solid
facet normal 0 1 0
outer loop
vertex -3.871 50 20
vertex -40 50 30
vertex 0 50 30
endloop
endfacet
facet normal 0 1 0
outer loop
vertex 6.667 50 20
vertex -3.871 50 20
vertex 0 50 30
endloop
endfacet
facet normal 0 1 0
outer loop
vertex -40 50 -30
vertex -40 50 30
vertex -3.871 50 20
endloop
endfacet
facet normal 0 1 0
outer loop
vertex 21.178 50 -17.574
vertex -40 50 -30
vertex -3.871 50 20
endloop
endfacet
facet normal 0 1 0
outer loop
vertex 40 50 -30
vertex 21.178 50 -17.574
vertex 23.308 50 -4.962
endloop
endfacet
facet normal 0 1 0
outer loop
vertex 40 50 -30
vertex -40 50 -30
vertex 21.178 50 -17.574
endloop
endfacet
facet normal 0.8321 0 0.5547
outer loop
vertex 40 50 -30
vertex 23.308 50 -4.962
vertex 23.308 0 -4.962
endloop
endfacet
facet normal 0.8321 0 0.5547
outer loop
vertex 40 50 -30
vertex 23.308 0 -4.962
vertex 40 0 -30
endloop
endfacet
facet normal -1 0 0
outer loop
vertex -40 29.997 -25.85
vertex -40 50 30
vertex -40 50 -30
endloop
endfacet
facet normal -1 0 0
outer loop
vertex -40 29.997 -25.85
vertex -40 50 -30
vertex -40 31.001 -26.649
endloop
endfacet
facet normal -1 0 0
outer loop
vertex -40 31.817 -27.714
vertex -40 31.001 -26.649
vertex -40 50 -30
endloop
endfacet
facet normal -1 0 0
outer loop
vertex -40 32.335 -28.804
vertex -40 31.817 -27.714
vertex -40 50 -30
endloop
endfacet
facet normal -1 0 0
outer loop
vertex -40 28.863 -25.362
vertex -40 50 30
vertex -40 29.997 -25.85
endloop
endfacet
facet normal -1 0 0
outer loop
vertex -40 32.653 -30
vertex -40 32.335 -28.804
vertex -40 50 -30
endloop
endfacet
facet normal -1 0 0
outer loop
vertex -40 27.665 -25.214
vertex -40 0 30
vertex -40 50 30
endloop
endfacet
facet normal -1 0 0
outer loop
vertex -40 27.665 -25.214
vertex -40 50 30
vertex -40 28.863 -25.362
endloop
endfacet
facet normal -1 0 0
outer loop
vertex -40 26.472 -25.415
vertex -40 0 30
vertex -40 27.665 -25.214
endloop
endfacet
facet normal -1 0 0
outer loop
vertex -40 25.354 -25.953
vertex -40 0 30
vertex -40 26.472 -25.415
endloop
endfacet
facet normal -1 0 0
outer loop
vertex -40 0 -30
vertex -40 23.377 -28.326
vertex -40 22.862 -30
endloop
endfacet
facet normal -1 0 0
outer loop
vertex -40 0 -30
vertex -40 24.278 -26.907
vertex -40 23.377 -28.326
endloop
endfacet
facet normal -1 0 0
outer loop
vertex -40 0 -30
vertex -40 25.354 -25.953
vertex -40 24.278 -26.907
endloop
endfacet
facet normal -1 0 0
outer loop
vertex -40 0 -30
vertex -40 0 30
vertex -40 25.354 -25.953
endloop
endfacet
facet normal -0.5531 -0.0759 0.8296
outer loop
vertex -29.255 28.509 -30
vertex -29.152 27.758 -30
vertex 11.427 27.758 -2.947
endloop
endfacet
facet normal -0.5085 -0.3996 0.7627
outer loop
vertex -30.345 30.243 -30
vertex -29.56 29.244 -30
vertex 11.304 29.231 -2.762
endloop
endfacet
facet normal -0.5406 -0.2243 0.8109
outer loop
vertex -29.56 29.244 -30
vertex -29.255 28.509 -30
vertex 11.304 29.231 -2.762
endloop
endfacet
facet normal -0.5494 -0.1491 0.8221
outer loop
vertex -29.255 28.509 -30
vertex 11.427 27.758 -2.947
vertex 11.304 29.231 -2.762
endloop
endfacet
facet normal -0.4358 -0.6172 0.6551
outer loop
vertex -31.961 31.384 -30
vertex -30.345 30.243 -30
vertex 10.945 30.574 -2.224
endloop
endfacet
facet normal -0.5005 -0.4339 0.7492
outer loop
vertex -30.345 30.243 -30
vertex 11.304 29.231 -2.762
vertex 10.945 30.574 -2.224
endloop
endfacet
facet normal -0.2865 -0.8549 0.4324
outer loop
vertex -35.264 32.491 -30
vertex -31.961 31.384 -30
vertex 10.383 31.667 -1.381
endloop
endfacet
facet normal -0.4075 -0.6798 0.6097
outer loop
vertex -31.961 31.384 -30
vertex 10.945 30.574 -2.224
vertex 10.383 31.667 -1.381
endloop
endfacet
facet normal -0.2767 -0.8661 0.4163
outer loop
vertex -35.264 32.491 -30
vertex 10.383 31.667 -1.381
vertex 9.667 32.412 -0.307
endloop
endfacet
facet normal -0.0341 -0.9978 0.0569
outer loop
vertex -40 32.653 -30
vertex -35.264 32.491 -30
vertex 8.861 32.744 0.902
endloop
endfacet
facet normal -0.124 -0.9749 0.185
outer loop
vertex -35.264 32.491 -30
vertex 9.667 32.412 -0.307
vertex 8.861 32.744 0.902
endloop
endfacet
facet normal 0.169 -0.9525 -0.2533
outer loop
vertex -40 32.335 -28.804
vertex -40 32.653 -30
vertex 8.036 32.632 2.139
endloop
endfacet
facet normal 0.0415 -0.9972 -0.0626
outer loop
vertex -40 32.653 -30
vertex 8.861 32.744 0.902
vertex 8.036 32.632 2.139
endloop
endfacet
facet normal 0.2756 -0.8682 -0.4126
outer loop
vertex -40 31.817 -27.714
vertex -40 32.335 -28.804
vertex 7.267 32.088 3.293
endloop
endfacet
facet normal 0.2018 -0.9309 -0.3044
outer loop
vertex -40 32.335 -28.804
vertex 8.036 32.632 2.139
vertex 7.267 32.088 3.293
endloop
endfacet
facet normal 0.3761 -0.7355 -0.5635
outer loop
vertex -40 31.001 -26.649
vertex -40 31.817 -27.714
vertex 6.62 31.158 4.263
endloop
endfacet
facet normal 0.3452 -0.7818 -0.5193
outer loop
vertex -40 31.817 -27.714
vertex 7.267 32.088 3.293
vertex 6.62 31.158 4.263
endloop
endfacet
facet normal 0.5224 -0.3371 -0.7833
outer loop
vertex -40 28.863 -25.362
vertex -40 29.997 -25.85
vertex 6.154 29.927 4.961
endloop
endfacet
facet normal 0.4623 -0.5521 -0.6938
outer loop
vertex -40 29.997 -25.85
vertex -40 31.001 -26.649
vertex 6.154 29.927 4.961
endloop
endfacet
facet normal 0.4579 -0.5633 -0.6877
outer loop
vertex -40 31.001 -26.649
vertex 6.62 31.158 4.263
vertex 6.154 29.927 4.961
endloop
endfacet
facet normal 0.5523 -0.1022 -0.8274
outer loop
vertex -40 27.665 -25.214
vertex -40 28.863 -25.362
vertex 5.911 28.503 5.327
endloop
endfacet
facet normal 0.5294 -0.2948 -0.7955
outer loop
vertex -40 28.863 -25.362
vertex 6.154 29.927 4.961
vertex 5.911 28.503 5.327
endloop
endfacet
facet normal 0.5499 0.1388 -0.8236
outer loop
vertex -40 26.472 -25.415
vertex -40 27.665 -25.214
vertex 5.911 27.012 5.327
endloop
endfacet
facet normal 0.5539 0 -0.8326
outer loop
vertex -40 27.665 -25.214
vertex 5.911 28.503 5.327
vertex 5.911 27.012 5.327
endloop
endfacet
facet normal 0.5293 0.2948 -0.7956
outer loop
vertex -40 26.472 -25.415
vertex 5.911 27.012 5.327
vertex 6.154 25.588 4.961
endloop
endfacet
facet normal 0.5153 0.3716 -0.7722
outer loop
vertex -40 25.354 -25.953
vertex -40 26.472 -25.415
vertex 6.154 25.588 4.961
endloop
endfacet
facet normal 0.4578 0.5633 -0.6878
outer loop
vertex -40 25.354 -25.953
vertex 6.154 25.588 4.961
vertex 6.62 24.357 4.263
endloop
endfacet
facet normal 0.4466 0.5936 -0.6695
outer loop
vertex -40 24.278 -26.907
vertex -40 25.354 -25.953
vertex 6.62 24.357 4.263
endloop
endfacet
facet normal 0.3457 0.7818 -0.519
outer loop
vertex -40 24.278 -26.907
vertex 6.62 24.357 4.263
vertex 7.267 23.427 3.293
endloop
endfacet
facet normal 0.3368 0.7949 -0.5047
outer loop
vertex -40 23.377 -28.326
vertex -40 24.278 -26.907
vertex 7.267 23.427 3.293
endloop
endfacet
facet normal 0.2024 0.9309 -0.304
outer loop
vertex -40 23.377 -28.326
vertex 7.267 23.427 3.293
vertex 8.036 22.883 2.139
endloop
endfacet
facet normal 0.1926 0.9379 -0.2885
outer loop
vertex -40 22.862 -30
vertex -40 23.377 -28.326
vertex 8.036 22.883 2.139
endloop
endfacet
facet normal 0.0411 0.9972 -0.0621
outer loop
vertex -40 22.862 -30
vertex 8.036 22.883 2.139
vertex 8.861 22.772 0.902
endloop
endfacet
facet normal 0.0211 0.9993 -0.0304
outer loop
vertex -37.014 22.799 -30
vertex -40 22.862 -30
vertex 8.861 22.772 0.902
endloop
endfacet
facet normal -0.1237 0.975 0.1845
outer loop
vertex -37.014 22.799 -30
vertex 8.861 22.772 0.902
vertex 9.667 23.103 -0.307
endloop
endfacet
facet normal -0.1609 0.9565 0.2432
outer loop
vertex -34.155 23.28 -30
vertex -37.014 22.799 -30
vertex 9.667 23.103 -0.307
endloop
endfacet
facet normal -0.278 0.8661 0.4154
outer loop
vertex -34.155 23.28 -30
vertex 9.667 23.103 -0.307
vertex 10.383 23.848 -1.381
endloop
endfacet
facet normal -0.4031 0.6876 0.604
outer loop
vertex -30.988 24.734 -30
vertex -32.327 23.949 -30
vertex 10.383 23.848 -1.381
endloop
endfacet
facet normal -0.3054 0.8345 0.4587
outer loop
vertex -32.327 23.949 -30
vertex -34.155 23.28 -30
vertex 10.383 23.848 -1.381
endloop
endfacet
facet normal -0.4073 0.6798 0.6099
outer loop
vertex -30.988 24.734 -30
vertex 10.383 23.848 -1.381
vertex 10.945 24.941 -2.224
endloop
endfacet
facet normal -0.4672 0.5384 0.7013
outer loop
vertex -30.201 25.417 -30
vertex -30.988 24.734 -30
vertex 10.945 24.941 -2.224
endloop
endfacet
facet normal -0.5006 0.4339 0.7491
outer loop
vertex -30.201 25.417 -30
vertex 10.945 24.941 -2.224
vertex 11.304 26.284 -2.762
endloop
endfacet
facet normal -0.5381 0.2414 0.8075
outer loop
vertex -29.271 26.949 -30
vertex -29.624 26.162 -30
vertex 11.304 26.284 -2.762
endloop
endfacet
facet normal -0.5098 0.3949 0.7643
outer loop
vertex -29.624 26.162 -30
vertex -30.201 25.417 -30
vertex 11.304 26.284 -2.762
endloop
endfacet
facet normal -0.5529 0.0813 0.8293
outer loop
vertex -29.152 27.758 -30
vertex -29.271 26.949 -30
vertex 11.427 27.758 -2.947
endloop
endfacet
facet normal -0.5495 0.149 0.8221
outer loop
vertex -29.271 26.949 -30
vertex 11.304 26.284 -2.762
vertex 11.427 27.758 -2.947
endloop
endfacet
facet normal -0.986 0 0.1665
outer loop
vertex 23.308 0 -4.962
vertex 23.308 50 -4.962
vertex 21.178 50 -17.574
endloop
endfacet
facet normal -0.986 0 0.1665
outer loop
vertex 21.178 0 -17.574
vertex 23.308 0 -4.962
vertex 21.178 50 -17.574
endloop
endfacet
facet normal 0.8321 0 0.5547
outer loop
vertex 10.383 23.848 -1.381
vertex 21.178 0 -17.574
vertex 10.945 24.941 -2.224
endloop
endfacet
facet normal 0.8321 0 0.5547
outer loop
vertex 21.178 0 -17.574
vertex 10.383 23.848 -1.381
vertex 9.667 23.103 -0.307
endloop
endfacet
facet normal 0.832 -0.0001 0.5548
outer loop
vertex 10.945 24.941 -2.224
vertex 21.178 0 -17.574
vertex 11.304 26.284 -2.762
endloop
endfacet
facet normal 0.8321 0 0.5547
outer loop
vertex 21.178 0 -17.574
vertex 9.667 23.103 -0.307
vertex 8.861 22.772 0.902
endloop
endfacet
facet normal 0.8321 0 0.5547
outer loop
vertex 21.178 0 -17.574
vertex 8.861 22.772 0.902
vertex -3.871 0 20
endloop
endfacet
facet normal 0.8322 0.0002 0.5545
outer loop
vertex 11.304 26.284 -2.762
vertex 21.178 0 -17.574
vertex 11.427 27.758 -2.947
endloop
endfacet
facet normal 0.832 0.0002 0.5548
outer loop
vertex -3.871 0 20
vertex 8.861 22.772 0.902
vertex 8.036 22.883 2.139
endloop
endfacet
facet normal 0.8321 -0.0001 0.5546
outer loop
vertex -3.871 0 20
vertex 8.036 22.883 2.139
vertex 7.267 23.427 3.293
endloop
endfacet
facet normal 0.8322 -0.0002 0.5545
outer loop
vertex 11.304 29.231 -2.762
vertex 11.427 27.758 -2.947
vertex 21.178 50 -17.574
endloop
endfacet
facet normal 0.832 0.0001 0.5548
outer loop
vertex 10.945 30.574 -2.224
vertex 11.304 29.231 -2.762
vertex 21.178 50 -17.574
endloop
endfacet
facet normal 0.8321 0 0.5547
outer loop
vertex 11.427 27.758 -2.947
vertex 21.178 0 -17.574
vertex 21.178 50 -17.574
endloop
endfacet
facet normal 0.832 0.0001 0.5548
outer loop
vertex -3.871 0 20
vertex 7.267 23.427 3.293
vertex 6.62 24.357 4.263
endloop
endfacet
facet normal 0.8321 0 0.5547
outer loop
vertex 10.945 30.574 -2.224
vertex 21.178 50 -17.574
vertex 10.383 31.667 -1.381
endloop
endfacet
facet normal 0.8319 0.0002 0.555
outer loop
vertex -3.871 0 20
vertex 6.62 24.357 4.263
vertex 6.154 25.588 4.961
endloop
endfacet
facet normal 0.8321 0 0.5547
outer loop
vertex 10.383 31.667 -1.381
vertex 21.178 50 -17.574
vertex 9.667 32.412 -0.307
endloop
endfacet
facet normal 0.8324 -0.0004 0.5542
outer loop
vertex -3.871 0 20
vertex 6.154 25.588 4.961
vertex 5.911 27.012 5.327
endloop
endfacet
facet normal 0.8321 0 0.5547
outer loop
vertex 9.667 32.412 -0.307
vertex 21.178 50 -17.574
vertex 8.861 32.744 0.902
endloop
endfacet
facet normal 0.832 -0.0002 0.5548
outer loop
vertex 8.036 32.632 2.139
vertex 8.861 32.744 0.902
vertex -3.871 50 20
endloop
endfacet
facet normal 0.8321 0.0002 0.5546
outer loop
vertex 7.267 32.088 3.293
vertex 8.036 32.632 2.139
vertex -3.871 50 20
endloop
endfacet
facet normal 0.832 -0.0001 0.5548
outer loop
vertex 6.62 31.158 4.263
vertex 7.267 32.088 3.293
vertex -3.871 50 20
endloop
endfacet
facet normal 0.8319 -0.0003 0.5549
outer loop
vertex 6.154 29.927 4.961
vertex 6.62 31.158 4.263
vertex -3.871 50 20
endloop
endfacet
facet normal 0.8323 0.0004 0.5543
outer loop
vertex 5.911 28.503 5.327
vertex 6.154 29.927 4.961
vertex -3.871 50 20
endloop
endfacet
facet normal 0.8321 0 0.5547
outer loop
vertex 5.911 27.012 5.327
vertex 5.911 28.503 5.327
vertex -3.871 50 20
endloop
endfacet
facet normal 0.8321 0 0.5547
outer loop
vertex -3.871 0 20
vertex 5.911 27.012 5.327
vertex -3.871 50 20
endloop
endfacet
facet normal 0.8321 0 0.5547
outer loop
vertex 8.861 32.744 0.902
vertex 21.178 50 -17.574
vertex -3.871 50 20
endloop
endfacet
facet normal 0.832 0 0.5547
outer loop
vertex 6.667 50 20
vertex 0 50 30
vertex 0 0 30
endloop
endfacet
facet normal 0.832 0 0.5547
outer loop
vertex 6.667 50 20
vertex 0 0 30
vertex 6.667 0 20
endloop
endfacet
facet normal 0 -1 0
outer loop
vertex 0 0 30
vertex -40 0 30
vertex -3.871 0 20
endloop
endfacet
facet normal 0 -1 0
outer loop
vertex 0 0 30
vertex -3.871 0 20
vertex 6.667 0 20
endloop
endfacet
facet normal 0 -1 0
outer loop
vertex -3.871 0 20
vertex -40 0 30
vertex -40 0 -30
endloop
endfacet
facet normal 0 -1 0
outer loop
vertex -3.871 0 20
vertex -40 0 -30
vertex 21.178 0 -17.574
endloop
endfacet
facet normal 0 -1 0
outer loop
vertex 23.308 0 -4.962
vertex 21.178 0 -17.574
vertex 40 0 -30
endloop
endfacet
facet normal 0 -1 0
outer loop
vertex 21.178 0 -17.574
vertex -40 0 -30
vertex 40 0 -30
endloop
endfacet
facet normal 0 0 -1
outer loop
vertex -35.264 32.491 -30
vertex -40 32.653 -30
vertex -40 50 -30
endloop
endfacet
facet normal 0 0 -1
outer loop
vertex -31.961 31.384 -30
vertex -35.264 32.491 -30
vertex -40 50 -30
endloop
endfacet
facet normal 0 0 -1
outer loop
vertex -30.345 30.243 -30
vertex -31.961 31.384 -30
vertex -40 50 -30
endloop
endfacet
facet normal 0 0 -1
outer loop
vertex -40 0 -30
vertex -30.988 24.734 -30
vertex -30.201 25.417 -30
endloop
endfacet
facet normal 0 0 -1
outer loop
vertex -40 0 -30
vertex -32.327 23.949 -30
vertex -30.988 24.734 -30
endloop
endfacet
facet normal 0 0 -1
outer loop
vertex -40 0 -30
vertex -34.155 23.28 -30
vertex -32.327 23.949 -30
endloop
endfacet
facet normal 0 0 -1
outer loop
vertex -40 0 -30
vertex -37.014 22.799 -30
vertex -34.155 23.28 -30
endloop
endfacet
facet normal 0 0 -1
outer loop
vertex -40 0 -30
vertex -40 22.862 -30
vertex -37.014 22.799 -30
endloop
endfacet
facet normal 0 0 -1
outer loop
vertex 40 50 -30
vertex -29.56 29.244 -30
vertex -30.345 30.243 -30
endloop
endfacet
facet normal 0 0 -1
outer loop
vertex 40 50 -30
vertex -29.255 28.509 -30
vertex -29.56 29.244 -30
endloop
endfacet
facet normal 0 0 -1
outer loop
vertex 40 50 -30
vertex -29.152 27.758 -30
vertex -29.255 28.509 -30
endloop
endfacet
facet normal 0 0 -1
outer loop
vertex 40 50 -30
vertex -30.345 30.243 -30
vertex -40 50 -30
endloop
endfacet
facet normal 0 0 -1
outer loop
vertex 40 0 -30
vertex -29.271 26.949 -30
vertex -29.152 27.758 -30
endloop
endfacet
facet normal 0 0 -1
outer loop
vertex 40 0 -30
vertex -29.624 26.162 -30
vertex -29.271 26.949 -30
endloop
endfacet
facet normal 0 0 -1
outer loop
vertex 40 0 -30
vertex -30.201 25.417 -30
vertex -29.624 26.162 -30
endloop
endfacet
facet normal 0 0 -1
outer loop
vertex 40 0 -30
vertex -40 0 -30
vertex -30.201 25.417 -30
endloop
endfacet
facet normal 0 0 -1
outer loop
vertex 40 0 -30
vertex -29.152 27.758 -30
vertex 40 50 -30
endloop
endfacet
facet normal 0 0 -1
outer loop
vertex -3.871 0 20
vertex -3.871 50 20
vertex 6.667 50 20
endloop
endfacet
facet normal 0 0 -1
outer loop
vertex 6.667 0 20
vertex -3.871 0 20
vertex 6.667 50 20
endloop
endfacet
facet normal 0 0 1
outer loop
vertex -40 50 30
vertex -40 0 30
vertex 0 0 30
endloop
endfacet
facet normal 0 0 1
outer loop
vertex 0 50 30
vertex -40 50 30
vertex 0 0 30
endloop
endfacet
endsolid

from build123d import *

# Parameters (mm, degrees)
SKETCH2_W           = 80
SKETCH2_H           = 60
BOSS_EXTRUDE2_DEPTH = 50
CUT_EXTRUDE1_DEPTH  = 51
CUT_EXTRUDE3_DEPTH  = 51
SKETCH10_R          = 5
CUT_EXTRUDE4_DEPTH  = 58.795911827


with BuildPart() as part:
    # Sketch2 → Boss-Extrude2 (new body)
    with BuildSketch(Plane(origin=(0, 0, 0), x_dir=(1, 0, 0), z_dir=(0, 1, 0))):
        Rectangle(SKETCH2_W, SKETCH2_H)
    extrude(amount=BOSS_EXTRUDE2_DEPTH)

    # Sketch4 → Cut-Extrude1 (cut, through all)
    with BuildSketch(Plane(origin=(0, 50, 0), x_dir=(1, 0, 0), z_dir=(0, 1, 0))):
        Polygon((0, -30), (40, 30), (40, -30), align=None)
    extrude(amount=-CUT_EXTRUDE1_DEPTH, mode=Mode.SUBTRACT)

    # Sketch9 → Cut-Extrude3 (cut, through all)
    with BuildSketch(Plane(origin=(0, 50, 0), x_dir=(1, 0, 0), z_dir=(0, 1, 0))):
        Polygon((23.307672553, 4.96150883), (21.177929754, 17.573832829), (-3.871292132, -20), (6.666666667, -20), align=None)
    extrude(amount=-CUT_EXTRUDE3_DEPTH, mode=Mode.SUBTRACT)

    # Sketch10 → Cut-Extrude4 (cut, through all)
    with BuildSketch(Plane(origin=(6.550643909, 0, 4.367095939), x_dir=(0.554700196, 0, -0.832050294), z_dir=(0.832050294, 0, 0.554700196))):
        with Locations((3.790651088, 27.7575331)):
            Circle(SKETCH10_R)
    extrude(amount=-CUT_EXTRUDE4_DEPTH, mode=Mode.SUBTRACT)


solid = part.part
